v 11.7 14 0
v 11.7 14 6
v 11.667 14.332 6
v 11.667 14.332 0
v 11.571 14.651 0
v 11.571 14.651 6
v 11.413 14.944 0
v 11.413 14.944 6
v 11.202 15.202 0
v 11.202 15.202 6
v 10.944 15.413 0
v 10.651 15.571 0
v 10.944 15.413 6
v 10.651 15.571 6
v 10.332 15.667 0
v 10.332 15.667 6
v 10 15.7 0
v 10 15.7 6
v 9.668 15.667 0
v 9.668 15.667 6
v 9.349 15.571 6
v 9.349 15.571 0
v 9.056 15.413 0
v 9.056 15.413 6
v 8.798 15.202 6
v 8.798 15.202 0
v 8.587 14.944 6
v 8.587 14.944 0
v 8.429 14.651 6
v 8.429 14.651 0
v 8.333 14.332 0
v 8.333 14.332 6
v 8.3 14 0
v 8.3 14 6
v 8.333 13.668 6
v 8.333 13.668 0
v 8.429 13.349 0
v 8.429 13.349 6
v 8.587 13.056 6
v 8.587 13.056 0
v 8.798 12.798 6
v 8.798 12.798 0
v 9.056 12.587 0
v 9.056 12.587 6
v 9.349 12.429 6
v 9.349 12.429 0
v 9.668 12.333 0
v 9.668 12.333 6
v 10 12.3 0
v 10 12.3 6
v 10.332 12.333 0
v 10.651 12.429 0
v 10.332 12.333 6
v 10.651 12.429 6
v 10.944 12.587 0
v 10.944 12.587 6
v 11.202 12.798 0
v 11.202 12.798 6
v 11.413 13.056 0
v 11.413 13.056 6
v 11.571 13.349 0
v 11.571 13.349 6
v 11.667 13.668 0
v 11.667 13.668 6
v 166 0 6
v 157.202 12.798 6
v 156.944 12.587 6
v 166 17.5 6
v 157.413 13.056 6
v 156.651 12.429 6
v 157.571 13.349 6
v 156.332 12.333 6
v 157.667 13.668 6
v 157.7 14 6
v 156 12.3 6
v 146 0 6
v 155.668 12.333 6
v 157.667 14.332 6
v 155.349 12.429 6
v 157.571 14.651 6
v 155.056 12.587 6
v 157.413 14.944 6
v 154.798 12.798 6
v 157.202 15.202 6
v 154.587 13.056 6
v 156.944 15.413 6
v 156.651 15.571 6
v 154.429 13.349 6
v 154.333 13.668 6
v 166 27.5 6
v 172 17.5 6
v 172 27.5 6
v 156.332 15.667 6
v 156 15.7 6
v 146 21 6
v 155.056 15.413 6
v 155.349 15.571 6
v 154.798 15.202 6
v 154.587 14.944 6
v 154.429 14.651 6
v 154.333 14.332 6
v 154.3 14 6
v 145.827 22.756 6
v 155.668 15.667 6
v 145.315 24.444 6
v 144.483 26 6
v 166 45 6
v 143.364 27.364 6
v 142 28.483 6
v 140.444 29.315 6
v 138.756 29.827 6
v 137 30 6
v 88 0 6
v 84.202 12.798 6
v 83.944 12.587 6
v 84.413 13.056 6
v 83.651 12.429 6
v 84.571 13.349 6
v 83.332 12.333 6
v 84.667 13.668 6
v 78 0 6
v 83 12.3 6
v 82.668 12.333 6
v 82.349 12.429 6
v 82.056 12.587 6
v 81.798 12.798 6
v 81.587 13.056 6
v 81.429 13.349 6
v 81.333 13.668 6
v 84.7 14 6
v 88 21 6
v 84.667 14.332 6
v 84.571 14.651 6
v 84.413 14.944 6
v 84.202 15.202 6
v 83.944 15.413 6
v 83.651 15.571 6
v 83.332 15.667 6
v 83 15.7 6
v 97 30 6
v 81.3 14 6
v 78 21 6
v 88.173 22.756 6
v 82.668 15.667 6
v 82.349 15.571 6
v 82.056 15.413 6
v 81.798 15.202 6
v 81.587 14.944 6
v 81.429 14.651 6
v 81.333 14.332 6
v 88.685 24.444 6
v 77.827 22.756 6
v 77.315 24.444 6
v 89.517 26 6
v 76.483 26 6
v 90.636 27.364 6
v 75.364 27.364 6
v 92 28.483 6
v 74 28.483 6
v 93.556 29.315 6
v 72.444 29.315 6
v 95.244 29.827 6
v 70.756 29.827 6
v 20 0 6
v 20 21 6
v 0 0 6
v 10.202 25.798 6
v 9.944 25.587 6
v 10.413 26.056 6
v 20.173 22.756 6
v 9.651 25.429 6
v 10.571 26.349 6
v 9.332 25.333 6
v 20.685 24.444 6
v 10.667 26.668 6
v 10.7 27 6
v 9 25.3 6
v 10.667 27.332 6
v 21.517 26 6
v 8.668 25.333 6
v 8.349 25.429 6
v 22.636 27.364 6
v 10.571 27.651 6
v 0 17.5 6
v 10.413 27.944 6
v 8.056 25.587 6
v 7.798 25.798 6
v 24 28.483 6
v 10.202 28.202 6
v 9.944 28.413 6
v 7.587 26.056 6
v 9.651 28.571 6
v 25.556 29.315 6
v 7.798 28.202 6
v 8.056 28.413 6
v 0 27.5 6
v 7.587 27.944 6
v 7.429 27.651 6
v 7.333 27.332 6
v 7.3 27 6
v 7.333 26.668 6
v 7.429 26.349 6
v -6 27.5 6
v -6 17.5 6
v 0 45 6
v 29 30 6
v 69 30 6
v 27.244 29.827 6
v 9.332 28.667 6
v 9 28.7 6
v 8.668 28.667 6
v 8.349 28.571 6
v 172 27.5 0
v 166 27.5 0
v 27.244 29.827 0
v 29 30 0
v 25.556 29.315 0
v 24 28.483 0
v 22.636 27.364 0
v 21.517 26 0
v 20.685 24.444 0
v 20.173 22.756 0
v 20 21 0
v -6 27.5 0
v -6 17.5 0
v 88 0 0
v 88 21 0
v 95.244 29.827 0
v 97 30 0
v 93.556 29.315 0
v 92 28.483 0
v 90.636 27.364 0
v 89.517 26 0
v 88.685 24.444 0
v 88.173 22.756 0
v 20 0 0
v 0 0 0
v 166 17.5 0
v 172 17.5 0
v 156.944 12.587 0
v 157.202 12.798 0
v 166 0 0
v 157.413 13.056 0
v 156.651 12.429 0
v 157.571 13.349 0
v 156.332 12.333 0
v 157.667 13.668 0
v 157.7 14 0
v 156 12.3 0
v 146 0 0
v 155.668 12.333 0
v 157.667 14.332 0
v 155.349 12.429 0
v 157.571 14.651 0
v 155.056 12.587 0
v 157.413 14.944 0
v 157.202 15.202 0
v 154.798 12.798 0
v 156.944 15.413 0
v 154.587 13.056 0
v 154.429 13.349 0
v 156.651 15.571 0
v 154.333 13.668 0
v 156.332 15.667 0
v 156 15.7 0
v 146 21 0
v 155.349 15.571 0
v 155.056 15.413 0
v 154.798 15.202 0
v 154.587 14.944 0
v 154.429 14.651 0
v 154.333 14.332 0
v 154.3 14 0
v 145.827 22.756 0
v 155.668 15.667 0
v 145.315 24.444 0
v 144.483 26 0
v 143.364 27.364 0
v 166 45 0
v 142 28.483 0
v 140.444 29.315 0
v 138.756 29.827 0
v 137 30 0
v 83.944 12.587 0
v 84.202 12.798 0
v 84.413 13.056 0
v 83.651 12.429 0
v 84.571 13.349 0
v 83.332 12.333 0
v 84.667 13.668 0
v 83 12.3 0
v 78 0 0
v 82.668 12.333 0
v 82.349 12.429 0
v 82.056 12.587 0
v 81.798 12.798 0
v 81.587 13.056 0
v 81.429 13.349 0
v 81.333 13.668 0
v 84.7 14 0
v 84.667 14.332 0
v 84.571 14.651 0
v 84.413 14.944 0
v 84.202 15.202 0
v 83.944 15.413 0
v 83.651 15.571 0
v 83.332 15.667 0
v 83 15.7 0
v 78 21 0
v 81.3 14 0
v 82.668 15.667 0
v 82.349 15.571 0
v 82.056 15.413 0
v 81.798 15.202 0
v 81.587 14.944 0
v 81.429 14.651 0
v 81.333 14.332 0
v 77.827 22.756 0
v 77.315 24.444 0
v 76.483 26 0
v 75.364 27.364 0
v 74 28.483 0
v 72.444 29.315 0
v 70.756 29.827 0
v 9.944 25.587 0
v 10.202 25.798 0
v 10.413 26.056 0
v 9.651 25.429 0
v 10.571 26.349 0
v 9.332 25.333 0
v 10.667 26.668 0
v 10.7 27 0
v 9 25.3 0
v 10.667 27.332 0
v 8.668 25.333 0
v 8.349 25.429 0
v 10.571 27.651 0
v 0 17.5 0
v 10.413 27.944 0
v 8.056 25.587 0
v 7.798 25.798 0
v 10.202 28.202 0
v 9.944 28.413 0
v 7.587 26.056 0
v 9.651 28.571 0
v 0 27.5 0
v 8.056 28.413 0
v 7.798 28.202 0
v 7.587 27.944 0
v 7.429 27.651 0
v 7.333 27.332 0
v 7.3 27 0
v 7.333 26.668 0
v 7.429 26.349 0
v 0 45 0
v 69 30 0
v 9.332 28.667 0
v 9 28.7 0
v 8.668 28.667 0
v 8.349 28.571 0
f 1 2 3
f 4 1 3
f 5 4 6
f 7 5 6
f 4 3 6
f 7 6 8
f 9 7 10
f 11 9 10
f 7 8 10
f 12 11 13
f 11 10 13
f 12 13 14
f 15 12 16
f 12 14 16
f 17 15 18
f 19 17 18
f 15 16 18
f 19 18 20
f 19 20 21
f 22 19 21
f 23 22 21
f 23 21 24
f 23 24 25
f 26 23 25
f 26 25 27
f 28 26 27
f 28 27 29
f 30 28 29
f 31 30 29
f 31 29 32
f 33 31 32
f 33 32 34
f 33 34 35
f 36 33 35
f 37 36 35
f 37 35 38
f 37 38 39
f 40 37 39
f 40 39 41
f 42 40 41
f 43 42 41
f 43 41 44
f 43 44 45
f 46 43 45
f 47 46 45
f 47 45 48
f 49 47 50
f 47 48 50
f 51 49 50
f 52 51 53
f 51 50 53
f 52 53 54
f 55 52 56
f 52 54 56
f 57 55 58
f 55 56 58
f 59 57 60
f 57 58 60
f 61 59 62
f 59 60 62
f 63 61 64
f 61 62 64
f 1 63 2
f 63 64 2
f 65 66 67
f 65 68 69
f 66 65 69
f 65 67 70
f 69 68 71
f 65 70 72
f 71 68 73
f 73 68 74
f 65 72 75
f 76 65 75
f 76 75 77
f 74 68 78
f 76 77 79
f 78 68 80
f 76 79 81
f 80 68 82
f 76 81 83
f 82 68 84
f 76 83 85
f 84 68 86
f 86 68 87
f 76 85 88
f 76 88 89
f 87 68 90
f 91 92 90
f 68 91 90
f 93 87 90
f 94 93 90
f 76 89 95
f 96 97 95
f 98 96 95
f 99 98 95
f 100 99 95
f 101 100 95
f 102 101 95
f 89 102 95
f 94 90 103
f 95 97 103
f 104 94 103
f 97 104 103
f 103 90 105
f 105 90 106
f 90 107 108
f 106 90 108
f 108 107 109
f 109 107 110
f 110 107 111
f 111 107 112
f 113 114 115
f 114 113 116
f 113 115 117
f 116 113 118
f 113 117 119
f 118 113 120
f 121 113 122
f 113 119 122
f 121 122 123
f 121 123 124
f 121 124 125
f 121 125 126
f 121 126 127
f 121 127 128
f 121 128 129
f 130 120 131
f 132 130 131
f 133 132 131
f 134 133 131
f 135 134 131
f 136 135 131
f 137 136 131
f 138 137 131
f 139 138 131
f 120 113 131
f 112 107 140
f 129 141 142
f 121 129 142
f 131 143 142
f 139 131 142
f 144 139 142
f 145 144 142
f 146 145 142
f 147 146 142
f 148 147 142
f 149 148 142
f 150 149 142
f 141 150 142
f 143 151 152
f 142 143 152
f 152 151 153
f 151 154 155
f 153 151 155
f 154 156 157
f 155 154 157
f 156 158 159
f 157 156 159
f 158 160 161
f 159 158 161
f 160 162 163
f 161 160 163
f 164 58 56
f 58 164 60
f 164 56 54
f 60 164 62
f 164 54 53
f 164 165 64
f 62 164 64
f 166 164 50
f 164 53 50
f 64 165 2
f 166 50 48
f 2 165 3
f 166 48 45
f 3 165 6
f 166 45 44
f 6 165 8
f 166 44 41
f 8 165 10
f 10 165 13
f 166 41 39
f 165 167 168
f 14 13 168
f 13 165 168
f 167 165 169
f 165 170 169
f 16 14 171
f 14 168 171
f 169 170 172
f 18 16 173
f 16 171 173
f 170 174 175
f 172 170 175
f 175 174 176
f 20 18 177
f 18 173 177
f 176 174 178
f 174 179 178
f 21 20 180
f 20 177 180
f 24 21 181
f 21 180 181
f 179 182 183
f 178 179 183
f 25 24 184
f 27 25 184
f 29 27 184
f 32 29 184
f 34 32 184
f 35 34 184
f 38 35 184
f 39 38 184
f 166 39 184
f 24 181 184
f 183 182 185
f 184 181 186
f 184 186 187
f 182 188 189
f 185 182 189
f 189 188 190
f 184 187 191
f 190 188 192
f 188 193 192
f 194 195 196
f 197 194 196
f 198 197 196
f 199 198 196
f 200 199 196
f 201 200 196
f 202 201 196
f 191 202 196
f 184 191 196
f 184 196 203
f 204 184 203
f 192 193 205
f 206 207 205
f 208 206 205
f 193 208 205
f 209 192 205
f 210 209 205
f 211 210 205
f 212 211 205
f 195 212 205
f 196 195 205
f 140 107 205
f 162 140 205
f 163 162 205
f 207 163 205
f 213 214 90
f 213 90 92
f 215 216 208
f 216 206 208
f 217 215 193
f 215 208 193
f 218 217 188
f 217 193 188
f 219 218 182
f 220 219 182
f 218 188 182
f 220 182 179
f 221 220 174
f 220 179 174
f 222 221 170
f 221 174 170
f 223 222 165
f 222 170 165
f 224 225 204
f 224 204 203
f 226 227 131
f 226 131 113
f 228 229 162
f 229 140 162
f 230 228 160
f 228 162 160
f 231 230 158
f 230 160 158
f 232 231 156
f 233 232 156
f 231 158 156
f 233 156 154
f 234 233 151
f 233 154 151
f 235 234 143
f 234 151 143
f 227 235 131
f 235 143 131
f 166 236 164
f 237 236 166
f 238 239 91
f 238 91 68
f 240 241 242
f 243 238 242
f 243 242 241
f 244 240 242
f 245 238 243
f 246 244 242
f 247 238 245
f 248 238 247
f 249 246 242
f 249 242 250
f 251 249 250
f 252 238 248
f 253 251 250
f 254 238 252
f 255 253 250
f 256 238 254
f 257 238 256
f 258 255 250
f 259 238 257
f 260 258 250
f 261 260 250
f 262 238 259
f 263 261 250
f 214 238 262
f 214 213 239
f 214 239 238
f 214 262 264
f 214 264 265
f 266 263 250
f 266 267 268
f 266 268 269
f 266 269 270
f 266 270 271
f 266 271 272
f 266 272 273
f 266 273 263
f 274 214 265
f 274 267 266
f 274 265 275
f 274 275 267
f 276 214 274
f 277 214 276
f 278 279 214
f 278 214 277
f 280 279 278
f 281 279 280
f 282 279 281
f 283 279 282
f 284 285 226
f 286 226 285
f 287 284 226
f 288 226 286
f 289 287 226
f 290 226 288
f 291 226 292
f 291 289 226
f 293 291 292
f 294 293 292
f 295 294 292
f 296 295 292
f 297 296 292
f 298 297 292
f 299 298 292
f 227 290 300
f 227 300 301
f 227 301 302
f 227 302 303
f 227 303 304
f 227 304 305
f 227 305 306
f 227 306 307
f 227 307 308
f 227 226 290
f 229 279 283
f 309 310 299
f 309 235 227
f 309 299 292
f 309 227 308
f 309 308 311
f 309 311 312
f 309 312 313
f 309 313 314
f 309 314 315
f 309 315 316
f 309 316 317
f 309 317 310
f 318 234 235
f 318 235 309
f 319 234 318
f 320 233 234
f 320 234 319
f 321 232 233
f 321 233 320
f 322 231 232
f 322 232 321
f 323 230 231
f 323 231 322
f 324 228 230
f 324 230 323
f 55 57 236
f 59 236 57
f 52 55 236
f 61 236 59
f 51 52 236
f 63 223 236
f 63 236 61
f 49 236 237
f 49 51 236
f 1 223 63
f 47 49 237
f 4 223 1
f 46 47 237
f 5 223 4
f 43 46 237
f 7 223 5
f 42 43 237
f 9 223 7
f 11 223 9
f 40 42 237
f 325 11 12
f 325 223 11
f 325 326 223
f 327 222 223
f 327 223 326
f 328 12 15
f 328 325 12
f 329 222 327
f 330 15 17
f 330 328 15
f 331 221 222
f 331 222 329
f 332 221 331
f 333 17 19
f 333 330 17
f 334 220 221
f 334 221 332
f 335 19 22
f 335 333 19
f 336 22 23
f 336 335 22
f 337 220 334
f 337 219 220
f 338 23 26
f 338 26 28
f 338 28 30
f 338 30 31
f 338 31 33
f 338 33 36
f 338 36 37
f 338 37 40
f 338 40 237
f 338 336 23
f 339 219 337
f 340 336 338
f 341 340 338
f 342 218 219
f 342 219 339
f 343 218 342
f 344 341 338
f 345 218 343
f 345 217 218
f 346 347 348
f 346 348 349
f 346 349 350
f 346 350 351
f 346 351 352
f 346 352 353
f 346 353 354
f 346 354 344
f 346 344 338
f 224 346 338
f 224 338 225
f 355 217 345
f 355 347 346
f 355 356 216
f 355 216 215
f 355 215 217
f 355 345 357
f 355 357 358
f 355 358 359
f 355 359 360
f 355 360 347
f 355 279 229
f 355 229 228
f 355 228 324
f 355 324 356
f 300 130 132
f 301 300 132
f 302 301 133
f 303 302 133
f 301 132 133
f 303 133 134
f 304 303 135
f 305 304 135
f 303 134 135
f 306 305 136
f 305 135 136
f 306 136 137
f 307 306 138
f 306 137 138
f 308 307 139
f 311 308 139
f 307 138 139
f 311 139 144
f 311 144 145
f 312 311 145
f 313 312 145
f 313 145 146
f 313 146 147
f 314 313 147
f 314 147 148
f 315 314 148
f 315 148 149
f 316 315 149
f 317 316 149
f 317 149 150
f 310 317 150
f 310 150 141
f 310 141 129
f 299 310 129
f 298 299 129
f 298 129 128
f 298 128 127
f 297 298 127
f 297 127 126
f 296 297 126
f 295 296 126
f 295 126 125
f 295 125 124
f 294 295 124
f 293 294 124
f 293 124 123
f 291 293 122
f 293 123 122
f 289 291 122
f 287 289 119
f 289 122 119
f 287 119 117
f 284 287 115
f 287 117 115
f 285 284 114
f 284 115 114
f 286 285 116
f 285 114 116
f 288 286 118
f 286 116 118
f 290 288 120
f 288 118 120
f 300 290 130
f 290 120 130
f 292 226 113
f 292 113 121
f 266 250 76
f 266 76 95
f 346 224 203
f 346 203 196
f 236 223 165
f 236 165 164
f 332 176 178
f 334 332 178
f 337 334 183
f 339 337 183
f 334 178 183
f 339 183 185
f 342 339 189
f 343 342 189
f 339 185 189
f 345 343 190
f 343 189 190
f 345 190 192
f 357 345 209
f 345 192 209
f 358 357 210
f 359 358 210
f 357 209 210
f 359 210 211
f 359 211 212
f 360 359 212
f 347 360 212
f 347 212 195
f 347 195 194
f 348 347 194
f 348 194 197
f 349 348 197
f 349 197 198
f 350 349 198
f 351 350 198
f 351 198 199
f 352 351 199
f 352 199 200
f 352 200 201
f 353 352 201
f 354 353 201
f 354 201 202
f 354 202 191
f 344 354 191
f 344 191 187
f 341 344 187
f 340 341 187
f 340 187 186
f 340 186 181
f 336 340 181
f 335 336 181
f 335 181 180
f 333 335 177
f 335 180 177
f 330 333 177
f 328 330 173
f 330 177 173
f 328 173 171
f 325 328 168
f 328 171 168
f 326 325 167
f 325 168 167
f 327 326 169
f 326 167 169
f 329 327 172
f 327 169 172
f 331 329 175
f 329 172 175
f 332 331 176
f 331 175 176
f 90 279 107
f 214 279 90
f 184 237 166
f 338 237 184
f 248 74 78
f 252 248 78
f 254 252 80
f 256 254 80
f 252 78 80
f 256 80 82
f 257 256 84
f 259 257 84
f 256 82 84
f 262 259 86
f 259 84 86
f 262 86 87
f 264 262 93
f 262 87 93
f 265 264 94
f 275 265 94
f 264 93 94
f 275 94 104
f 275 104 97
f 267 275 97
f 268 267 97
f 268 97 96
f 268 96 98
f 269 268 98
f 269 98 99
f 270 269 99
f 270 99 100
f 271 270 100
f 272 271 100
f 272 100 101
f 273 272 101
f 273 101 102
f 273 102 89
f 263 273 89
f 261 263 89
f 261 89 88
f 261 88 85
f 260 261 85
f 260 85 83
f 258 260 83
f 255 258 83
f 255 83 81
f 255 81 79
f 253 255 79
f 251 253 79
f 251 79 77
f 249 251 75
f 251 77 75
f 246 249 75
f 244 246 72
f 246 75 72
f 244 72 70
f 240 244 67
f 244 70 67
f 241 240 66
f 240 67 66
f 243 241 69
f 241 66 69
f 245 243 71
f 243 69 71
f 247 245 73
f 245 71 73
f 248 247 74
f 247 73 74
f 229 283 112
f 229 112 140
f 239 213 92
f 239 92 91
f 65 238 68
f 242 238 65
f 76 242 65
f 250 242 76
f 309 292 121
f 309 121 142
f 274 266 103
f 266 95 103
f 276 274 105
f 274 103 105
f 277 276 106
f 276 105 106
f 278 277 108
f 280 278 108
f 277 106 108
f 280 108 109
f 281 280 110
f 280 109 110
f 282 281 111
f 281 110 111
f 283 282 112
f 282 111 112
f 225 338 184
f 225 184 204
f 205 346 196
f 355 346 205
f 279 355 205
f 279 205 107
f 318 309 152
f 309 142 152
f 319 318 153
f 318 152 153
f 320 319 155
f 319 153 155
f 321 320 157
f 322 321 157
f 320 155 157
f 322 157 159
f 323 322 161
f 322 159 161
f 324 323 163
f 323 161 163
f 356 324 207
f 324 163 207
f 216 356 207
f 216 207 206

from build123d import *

# Parameters (mm, degrees)
BOSS_EXTRUDE1_DEPTH = 6
FILLET1_R           = 9
SKETCH2_R           = 1.7
CUT_EXTRUDE1_DEPTH  = 178.890415706
SKETCH3_R           = 1.7
CUT_EXTRUDE2_DEPTH  = 178.890415706


with BuildPart() as part:
    # Sketch1 → Boss-Extrude1 (new body)
    with BuildSketch(Plane.XY):
        Polygon((0, 0), (0, 17.5), (-6, 17.5), (-6, 27.5), (0, 27.5), (0, 45), (166, 45), (166, 27.5), (172, 27.5), (172, 17.5), (166, 17.5), (166, 0), (146, 0), (146, 30), (88, 30), (88, 0), (78, 0), (78, 30), (20, 30), (20, 0), align=None)
    extrude(amount=BOSS_EXTRUDE1_DEPTH)

    # Fillet1
    fillet1_edges = [part.edges().sort_by_distance(p)[0] for p in [
        (146, 30, 3),
        (88, 30, 3),
        (78, 30, 3),
        (20, 30, 3),
    ]]
    fillet(fillet1_edges, radius=FILLET1_R)

    # Sketch2 → Cut-Extrude1 (cut, through all)
    with BuildSketch(Plane.XY.offset(6)):
        with Locations((10, 14)):
            Circle(SKETCH2_R)
        with Locations((83, 14)):
            Circle(SKETCH2_R)
        with Locations((156, 14)):
            Circle(SKETCH2_R)
    extrude(amount=-CUT_EXTRUDE1_DEPTH, mode=Mode.SUBTRACT)

    # Sketch3 → Cut-Extrude2 (cut, through all)
    with BuildSketch(Plane.XY.offset(6)):
        with Locations((9, 27)):
            Circle(SKETCH3_R)
    extrude(amount=-CUT_EXTRUDE2_DEPTH, mode=Mode.SUBTRACT)


solid = part.part
